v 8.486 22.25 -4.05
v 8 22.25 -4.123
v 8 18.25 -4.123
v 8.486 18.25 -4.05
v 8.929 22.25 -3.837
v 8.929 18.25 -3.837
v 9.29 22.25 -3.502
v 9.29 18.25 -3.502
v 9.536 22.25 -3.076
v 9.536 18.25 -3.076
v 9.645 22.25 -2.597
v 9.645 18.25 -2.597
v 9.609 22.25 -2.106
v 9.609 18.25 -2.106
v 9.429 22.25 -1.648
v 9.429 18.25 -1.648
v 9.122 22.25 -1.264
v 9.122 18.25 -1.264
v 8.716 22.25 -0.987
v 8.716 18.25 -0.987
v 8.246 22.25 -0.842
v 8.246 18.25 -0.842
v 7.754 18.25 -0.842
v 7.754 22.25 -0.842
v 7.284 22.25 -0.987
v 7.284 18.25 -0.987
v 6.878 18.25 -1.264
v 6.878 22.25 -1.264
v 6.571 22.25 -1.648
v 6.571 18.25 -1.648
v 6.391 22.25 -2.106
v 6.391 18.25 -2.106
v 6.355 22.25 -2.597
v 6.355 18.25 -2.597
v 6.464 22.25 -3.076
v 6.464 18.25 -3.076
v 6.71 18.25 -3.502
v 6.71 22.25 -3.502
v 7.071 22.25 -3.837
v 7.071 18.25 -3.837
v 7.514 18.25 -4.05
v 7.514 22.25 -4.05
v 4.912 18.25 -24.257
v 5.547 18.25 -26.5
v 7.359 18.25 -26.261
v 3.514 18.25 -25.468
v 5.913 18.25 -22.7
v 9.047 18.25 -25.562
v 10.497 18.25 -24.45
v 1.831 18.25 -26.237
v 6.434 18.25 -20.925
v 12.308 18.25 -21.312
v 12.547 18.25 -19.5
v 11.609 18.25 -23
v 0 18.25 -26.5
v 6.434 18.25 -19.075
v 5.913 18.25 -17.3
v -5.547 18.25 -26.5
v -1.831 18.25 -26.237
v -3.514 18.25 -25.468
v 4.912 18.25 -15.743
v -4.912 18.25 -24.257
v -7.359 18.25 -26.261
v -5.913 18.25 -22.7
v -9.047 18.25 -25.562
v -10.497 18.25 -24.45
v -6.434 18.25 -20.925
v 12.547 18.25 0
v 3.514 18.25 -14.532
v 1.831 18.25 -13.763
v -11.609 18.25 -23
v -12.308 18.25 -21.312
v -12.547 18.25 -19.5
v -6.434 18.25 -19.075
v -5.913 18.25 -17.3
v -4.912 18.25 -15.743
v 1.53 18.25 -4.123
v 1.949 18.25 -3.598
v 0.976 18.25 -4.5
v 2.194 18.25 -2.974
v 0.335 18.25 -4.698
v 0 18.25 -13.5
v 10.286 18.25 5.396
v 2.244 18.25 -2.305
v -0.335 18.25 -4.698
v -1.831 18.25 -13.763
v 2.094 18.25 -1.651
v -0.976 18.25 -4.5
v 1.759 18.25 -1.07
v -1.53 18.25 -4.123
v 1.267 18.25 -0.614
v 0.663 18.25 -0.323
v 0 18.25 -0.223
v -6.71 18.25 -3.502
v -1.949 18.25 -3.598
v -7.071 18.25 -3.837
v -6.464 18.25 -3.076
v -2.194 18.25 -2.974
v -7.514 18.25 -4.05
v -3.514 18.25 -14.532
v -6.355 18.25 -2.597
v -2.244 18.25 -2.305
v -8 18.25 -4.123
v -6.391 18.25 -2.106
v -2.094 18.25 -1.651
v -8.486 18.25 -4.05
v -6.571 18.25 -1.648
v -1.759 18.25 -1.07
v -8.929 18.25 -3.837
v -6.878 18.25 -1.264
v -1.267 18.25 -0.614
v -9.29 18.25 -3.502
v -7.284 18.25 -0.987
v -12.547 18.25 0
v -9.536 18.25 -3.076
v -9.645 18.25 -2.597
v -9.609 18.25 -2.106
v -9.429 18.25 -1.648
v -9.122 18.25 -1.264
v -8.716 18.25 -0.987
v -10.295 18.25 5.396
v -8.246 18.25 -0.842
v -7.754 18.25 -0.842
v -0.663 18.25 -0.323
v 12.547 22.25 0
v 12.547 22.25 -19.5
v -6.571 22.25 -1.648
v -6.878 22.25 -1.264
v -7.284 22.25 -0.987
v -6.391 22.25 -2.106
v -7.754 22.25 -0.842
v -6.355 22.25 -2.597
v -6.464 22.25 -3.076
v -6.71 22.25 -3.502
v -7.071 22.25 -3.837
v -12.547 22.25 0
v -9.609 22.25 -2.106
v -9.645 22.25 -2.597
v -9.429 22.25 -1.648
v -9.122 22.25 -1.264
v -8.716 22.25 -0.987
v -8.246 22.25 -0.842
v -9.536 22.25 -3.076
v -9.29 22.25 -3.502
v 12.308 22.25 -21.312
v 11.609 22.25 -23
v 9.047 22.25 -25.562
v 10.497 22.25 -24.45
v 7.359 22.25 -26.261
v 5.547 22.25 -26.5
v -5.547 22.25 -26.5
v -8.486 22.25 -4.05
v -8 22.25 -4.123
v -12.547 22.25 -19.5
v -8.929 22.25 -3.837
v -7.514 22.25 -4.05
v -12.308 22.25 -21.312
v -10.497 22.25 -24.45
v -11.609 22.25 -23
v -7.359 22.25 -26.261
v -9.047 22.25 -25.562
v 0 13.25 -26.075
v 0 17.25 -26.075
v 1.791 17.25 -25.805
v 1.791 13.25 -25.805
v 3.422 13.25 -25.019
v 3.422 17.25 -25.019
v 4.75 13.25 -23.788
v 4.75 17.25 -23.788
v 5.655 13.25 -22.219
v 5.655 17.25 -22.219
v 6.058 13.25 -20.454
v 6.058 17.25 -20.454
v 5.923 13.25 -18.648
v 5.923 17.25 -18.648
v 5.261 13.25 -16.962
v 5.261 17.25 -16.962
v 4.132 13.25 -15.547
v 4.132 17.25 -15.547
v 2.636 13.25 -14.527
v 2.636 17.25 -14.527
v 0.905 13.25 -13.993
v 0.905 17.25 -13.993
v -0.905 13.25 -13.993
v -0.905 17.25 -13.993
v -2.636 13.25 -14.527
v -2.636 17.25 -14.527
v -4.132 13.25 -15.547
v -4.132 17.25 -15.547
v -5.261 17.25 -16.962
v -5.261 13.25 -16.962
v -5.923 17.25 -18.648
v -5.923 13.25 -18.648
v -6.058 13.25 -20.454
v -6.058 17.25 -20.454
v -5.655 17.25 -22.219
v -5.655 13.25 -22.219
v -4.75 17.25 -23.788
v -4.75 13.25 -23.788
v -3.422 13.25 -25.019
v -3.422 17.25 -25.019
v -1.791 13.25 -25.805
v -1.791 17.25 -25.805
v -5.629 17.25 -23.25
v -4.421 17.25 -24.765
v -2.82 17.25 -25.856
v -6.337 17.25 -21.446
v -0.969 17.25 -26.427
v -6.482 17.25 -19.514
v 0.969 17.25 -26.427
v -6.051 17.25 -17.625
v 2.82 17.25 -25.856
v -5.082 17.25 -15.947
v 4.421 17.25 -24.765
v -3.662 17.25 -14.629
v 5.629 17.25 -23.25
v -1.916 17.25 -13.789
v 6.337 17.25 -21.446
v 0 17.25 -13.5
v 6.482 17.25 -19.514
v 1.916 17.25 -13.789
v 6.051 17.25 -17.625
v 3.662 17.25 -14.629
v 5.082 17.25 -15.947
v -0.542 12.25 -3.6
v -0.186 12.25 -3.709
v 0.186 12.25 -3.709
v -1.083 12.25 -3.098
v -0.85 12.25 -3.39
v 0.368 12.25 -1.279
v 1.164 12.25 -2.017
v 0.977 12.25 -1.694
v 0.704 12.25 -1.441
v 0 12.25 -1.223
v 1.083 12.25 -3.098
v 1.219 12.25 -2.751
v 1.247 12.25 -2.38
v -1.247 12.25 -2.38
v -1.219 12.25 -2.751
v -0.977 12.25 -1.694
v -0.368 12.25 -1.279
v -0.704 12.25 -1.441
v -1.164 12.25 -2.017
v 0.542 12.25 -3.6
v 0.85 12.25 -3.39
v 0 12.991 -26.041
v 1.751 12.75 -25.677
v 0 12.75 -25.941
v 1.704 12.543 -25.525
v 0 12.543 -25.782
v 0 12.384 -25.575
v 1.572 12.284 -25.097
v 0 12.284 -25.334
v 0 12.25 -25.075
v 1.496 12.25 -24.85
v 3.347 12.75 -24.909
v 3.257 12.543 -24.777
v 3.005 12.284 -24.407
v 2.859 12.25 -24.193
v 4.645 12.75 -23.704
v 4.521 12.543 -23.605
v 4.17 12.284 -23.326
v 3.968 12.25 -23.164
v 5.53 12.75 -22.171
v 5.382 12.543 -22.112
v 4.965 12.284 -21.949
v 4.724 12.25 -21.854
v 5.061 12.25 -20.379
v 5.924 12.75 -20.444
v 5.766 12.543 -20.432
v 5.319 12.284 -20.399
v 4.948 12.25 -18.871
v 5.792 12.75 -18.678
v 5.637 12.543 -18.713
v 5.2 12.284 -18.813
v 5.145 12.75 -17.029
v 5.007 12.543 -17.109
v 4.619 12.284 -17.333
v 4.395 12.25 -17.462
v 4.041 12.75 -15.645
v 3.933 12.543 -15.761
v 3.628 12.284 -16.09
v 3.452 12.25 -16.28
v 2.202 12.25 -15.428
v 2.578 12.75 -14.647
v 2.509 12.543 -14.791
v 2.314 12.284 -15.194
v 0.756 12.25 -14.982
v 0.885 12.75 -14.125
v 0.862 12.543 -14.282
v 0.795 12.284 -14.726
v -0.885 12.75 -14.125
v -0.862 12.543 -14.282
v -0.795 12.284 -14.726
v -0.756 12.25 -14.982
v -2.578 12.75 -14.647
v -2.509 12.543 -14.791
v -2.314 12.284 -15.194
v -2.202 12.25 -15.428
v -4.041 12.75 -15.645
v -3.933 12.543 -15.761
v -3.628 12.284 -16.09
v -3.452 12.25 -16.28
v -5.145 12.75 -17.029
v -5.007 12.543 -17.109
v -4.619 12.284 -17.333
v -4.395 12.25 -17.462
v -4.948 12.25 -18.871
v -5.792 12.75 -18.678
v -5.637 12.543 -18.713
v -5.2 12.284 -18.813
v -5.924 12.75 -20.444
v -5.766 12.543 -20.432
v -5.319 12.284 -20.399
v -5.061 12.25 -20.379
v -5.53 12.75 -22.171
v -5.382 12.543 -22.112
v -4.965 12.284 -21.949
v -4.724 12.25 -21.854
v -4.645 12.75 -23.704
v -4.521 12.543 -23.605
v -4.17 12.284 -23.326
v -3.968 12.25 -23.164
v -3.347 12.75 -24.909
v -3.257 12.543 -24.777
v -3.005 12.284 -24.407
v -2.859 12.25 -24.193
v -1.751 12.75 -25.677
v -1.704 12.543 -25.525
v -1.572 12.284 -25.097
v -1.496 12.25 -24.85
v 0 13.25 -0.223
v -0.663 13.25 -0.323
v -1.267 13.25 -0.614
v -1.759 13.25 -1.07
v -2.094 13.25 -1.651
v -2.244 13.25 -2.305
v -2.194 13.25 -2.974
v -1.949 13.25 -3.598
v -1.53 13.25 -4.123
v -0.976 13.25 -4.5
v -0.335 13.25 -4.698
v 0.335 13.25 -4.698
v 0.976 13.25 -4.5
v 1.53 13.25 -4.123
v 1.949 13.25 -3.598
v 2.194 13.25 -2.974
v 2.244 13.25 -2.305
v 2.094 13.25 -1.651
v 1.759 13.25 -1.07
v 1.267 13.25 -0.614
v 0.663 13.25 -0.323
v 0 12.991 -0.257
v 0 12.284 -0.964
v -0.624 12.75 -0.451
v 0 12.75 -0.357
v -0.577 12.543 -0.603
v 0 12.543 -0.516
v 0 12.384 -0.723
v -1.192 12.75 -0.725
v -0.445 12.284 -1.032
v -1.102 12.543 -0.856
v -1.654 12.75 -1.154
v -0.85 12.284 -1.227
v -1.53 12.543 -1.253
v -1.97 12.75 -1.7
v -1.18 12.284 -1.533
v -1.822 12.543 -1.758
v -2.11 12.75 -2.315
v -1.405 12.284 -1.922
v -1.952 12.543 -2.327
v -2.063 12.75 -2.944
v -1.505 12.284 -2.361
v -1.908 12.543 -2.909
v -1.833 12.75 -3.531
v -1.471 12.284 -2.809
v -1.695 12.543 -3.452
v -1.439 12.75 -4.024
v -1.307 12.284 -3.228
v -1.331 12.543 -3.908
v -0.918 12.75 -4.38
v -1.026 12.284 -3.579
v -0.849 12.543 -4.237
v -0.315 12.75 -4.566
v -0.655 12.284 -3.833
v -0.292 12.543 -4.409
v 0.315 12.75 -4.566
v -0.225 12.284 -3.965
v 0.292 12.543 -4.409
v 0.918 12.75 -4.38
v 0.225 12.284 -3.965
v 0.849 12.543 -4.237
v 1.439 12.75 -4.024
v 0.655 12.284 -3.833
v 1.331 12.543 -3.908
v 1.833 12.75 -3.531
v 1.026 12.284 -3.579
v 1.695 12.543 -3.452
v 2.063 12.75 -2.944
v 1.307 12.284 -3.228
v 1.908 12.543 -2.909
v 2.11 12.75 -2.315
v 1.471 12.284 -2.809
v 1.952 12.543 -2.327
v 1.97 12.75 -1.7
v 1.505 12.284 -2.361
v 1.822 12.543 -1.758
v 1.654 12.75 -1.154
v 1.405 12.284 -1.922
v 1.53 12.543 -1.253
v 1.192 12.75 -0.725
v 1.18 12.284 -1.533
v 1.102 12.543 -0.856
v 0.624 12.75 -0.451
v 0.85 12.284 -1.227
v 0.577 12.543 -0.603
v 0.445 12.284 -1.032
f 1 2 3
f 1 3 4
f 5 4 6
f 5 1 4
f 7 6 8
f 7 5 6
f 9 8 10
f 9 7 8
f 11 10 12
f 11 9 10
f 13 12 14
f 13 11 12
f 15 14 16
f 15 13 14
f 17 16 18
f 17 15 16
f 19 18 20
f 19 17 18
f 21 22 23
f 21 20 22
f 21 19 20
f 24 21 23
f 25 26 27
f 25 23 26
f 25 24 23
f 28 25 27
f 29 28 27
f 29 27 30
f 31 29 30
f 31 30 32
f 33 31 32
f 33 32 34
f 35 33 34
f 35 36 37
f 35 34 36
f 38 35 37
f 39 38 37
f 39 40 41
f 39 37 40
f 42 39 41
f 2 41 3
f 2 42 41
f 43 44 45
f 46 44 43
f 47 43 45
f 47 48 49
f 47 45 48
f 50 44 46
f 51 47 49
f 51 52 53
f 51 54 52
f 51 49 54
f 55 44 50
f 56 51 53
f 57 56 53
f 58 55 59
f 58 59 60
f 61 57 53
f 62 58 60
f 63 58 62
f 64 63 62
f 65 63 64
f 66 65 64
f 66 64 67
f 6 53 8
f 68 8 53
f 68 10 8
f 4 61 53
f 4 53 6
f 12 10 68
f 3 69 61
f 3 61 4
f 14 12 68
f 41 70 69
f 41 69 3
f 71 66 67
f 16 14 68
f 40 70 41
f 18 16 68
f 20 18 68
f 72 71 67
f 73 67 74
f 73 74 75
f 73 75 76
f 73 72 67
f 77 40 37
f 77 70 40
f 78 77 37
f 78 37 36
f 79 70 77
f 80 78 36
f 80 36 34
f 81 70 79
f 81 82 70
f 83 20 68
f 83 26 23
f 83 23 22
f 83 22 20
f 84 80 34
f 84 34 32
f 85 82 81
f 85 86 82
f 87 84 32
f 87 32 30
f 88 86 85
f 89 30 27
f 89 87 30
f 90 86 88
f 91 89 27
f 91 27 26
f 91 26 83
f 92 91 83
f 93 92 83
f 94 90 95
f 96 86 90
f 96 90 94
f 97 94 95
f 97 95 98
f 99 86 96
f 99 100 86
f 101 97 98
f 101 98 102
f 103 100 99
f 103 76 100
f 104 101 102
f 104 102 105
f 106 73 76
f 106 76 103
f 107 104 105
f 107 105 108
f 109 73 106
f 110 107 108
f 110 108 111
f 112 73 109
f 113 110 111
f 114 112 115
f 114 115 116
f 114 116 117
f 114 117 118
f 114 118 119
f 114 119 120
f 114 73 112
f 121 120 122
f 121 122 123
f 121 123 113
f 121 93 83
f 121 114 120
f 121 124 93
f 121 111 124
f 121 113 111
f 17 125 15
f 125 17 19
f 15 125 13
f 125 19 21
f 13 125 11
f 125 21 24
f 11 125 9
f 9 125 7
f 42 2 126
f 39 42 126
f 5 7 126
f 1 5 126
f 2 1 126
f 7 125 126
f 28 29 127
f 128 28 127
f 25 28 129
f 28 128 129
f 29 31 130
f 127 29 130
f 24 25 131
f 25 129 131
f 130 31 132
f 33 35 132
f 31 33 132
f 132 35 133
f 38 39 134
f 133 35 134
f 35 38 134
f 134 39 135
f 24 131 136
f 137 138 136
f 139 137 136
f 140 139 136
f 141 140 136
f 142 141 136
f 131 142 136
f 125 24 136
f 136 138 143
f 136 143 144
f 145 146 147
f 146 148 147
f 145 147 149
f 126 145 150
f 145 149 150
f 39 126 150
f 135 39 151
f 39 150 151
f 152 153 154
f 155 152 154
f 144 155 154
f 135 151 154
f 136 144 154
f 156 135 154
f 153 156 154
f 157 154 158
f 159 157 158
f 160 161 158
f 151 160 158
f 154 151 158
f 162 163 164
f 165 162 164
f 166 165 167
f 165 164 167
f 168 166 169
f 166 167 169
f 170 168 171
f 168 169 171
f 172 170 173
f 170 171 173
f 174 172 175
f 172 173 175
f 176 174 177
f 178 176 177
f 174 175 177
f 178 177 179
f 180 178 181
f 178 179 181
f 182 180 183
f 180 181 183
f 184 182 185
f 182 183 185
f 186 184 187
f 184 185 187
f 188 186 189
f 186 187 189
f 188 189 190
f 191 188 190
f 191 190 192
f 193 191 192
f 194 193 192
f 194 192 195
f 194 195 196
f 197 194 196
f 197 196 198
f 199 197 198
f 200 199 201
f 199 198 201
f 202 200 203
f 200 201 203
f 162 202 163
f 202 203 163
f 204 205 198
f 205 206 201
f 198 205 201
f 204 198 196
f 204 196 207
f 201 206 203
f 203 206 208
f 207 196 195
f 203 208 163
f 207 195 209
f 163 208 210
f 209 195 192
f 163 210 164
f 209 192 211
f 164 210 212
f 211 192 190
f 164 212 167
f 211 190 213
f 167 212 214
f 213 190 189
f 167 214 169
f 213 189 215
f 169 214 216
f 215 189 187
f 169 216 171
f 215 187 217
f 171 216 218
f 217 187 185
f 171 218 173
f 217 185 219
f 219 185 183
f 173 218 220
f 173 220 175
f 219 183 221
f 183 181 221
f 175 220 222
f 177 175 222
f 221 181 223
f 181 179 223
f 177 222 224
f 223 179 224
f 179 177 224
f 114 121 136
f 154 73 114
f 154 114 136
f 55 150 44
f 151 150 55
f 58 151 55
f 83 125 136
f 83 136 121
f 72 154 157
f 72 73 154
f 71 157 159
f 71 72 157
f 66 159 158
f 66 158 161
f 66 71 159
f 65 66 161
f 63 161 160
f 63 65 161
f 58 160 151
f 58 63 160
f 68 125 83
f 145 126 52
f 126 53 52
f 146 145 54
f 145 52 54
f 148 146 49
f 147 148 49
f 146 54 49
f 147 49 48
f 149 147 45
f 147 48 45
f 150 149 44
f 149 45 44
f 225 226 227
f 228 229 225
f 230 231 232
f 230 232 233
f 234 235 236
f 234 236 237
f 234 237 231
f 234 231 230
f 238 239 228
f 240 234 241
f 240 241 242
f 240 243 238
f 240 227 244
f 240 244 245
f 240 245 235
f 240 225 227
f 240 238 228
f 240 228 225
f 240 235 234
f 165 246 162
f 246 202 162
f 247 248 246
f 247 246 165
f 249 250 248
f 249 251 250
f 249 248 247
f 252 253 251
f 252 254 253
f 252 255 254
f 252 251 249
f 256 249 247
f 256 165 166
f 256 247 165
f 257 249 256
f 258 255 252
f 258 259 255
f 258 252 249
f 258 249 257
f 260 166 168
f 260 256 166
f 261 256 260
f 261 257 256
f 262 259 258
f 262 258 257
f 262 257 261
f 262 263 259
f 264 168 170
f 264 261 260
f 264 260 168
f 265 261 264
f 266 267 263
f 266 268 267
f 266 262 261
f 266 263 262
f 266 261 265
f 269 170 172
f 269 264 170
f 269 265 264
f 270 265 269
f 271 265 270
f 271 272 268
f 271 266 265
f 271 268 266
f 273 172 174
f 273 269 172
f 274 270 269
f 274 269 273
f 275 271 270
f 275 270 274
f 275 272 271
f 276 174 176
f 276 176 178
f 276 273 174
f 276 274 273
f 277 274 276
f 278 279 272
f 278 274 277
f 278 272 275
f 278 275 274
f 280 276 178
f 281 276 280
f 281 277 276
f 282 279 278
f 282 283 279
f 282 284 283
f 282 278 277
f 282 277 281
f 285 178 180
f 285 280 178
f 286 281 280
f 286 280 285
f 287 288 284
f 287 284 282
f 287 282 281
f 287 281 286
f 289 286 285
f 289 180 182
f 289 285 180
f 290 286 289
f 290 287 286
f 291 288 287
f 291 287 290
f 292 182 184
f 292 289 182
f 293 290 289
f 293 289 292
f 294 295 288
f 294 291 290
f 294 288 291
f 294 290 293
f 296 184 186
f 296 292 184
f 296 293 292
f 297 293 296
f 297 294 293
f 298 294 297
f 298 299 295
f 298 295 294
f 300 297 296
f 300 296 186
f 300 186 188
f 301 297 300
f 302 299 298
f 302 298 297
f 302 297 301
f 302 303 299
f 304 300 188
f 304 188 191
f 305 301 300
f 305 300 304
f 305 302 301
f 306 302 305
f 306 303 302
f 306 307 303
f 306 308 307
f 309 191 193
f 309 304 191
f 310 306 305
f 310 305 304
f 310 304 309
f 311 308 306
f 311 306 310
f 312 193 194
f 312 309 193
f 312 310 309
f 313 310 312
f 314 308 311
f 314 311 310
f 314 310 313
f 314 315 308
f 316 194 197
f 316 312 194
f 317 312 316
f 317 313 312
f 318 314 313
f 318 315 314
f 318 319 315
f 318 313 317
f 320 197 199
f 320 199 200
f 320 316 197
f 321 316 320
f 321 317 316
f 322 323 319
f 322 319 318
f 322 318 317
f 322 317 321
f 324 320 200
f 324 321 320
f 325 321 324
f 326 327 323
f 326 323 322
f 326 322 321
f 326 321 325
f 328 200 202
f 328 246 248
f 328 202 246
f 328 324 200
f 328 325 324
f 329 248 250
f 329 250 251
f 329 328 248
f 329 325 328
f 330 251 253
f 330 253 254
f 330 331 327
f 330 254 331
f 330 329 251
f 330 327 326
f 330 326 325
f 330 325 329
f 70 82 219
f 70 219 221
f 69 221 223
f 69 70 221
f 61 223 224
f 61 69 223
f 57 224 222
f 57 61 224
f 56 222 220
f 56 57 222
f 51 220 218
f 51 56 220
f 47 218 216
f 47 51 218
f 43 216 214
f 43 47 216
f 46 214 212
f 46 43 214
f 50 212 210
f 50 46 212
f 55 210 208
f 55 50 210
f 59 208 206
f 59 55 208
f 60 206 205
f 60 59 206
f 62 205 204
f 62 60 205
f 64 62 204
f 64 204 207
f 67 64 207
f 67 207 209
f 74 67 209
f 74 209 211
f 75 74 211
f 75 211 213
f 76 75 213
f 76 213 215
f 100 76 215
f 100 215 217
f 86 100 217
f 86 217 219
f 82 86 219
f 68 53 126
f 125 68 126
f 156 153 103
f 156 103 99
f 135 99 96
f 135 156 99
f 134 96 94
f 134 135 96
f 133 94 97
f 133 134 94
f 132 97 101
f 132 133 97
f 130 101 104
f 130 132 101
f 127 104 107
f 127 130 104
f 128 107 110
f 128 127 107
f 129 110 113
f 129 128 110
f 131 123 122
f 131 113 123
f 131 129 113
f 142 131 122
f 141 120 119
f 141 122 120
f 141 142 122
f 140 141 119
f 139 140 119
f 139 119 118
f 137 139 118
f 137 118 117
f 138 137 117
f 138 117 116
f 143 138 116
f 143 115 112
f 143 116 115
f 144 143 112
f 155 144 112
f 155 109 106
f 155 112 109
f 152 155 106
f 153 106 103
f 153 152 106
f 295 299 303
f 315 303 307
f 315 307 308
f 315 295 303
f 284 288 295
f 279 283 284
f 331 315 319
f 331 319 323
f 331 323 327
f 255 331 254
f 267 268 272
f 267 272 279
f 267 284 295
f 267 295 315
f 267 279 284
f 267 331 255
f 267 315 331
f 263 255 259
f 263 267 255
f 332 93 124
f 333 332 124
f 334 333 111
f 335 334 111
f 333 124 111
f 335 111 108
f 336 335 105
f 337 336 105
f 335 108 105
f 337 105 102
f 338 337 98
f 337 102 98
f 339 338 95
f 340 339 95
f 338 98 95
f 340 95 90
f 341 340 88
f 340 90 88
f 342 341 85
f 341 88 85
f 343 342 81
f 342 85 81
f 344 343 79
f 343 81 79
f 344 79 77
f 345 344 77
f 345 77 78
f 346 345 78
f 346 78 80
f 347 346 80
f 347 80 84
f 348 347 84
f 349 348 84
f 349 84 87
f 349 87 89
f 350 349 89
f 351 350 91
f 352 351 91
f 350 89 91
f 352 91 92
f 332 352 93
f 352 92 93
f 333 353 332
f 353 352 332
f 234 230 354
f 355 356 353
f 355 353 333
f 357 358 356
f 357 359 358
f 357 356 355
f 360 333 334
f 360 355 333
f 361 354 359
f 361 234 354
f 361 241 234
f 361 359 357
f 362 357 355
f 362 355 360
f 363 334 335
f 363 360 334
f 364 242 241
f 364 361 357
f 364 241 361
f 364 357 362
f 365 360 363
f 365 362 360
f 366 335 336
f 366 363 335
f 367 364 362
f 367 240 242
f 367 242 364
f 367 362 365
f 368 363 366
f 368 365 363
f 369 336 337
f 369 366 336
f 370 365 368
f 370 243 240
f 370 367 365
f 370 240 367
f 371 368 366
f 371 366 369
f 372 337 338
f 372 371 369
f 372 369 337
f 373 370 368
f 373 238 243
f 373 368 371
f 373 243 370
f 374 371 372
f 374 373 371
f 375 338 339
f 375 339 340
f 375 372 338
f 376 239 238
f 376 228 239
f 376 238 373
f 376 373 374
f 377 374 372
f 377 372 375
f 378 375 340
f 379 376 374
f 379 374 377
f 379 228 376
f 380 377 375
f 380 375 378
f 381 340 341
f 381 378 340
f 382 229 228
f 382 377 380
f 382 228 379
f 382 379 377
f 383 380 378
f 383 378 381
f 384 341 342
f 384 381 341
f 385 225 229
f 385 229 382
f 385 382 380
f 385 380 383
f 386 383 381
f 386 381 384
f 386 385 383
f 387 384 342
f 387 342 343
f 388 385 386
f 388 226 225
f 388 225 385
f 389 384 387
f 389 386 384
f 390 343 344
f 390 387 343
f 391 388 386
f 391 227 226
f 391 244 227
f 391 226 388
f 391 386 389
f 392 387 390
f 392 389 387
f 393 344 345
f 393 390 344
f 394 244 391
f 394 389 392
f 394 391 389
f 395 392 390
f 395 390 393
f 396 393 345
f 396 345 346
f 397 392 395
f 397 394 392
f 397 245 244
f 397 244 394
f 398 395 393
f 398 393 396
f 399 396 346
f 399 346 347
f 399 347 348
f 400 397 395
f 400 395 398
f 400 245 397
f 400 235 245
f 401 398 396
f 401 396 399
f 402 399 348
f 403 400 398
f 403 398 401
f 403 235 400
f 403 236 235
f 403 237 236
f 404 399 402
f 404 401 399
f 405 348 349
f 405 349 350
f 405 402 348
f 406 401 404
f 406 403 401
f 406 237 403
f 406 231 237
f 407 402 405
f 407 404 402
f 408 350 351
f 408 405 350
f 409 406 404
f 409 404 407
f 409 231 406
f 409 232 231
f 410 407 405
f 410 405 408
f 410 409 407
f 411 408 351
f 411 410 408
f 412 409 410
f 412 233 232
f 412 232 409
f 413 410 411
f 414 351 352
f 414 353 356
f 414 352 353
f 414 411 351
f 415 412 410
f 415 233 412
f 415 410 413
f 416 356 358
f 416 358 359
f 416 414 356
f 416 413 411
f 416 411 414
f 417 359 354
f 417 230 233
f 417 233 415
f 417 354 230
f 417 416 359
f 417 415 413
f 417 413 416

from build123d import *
from OCP.BRepFilletAPI import BRepFilletAPI_MakeChamfer

# Parameters (mm, degrees)
SKETCH4_W                = 12.46
SKETCH4_H                = 17.25
BOSS_EXTRUDE3_DEPTH      = 6
BOSS_EXTRUDE6_DEPTH      = 7.3
BOSS_EXTRUDE6_DEPTH_BACK = 17.25
SKETCH8_R                = 12.546781182
SKETCH8_R_2              = 11.15
BOSS_EXTRUDE4_DEPTH      = 17.25
SKETCH6_R                = 2
CUT_EXTRUDE1_DEPTH       = 5
CHAMFER1_SIZE            = 0.5
CHAMFER1_SIZE_2          = 0.866025404
SKETCH10_W               = 12.46
SKETCH10_H               = 23.7
CUT_EXTRUDE3_DEPTH       = 17.25
CUT_EXTRUDE4_REACH       = 43.938
SKETCH11_W               = 5
SKETCH11_H               = 3
BOSS_EXTRUDE7_START      = -7.3
BOSS_EXTRUDE7_DEPTH      = 7.3
BOSS_EXTRUDE9_START      = 10
BOSS_EXTRUDE9_DEPTH      = 10
BOSS_EXTRUDE10_DEPTH     = 25.093562364
SKETCH18_W               = 21.5
SKETCH18_H               = 12.438292938
CUT_EXTRUDE5_DEPTH       = 2
CUT_EXTRUDE6_DEPTH       = 58.154608998
CUT_EXTRUDE6_DEPTH_BACK  = 58.154608998
SKETCH19_R               = 3.5
FILLET1_R                = 7
CUT_EXTRUDE7_DEPTH       = 55.97840444
CUT_EXTRUDE7_DEPTH_BACK  = 55.97840444
SKETCH20_W               = 25.093562364
SKETCH20_H               = 36.096781182
BOSS_EXTRUDE11_DEPTH     = 44.5
CUT_EXTRUDE8_DEPTH       = 40.401576339
CUT_EXTRUDE8_DEPTH_BACK  = 40.401576339
CUT_EXTRUDE9_DEPTH       = 40.401576339
SKETCH24_R               = 6.5
BOSS_EXTRUDE12_DEPTH     = 5
SKETCH25_R               = 6.075
BOSS_EXTRUDE13_DEPTH     = 5
FILLET2_R                = 1
BOSS_EXTRUDE14_DEPTH     = 2
CUT_EXTRUDE10_REACH      = 57.104
SKETCH27_R               = 0.75
CUT_EXTRUDE11_DEPTH      = 45.983908275
CUT_EXTRUDE11_DEPTH_BACK = 45.983908275
CUT_EXTRUDE12_DEPTH      = 30.927775026
CUT_EXTRUDE12_DEPTH_BACK = 30.927775026
SKETCH29_R               = 1.65
SKETCH30_R               = 2.25
BOSS_EXTRUDE15_DEPTH     = 6
FILLET3_R                = 1


with BuildPart() as part:
    # Sketch4 → Boss-Extrude3 (new body)
    with BuildSketch(Plane.XY):
        with Locations((0, -1.35)):
            Rectangle(SKETCH4_W, SKETCH4_H)
    extrude(amount=BOSS_EXTRUDE3_DEPTH)



with BuildPart() as body_2:
    # Sketch8 → Boss-Extrude6 (new, two sides: drawn at the far end of the back side and taken through both)
    with BuildSketch(Plane(origin=(0, -9.975, 0), x_dir=(-1, 0, 0), z_dir=(0, -1, 0)).offset(-BOSS_EXTRUDE6_DEPTH_BACK)):
        with Locations(Location((0, -23.55, 0), (0, 0, 90))):
            Circle(SKETCH8_R)
        with Locations(Location((0, -23.55, 0), (0, 0, 90))):
            Circle(SKETCH8_R_2, mode=Mode.SUBTRACT)
    extrude(amount=BOSS_EXTRUDE6_DEPTH + BOSS_EXTRUDE6_DEPTH_BACK)


with BuildPart() as part_1:
    add(part.part)

    add(body_2.part)  # Boss-Extrude4 merges body 2
    # Sketch5 → Boss-Extrude4 (add)
    with BuildSketch(Plane(origin=(0, 7.275, 0), x_dir=(1, 0, 0), z_dir=(0, 1, 0))):
        with BuildLine():
            Line((12.546781182, -23.55), (12.546781182, 0))
            Line((12.546781182, 0), (6.23, 0))
            Line((6.23, 0), (6.23, -29.7))
            Line((6.23, -29.7), (-6.23, -29.7))
            Line((-6.23, -29.7), (-6.23, 0))
            Line((-6.23, 0), (-12.546781182, 0))
            Line((-12.546781182, 0), (-12.546781182, -23.55))
            ThreePointArc((-12.546781182, -23.55), (0, -36.096781182), (12.546781182, -23.55))
        make_face()
    extrude(amount=-BOSS_EXTRUDE4_DEPTH)

    # Sketch6 → Cut-Extrude1 (cut)
    with BuildSketch(Plane(origin=(0, 7.275, 0), x_dir=(1, 0, 0), z_dir=(0, 1, 0))):
        with Locations(Location((0, -3.5, 0), (0, 0, 270))):
            Circle(SKETCH6_R)
        with Locations(Location((0, -32.2, 0), (0, 0, 270))):
            Circle(SKETCH6_R)
    extrude(amount=-CUT_EXTRUDE1_DEPTH, mode=Mode.SUBTRACT)

    # Chamfer1
    chamfer1_edges_1 = [part_1.edges().sort_by_distance(p)[0] for p in [
        (0, 7.275, 1.5),
    ]]
    chamfer1_side_1 = [part_1.faces().sort_by_distance(p)[0] for p in [
        (0, 7.275, 1.49),
    ]]
    chamfer1_edges_2 = [part_1.edges().sort_by_distance(p)[0] for p in [
        (0, 7.275, 30.2),
    ]]
    chamfer1_side_2 = [part_1.faces().sort_by_distance(p)[0] for p in [
        (0, 7.275, 30.19),
    ]]
    chamfer1 = BRepFilletAPI_MakeChamfer(part_1.part.solid().wrapped)
    for e in chamfer1_edges_1:
        chamfer1.Add(CHAMFER1_SIZE - 0.0001, CHAMFER1_SIZE_2 - 0.0001, e.wrapped, chamfer1_side_1[0].wrapped)
    for e in chamfer1_edges_2:
        chamfer1.Add(CHAMFER1_SIZE - 0.0001, CHAMFER1_SIZE_2 - 0.0001, e.wrapped, chamfer1_side_2[0].wrapped)
    add(Compound.cast(chamfer1.Shape()), mode=Mode.REPLACE)  # a hair under: the kernel refuses the full size

    # Sketch10 → Cut-Extrude3 (cut)
    with BuildSketch(Plane(origin=(0, 7.275, 0), x_dir=(1, 0, 0), z_dir=(0, 1, 0))):
        with Locations((0, -17.85)):
            Rectangle(SKETCH10_W, SKETCH10_H)
    extrude(amount=-CUT_EXTRUDE3_DEPTH, mode=Mode.SUBTRACT)

    # Sketch11 → Cut-Extrude4 (cut, up to next)
    with BuildSketch(Plane.XY.offset(36.096781182), mode=Mode.PRIVATE) as cut_extrude4_sk1:
        with Locations((0, -8.475)):
            Rectangle(SKETCH11_W, SKETCH11_H)
    cut_extrude4_tool1 = extrude(cut_extrude4_sk1.sketch, amount=-CUT_EXTRUDE4_REACH, mode=Mode.PRIVATE) & part_1.part
    add(cut_extrude4_tool1.solids().sort_by_distance((0, -8.475, 36.096781))[0], mode=Mode.SUBTRACT)

    # Sketch13 → Boss-Extrude7 (add)
    with BuildSketch(Plane.XZ.offset(17.275).offset(BOSS_EXTRUDE7_START)):
        with BuildLine():
            Line((-12.546781182, 23.55), (-12.546781182, 0))
            Line((-12.546781182, 0), (12.546781182, 0))
            Line((12.546781182, 0), (12.546781182, 23.55))
            ThreePointArc((12.546781182, 23.55), (0, 11.003218818), (-12.546781182, 23.55))
        make_face()
    extrude(amount=BOSS_EXTRUDE7_DEPTH)

    # Sketch15 → Boss-Extrude9 (add)
    with BuildSketch(Plane(origin=(0, 7.275, 0), x_dir=(1, 0, 0), z_dir=(0, 1, 0)).offset(BOSS_EXTRUDE9_START)):
        with BuildLine():
            Line((-12.546781182, 0), (12.546781182, 0))
            Line((12.546781182, 0), (12.546781182, -23.55))
            ThreePointArc((12.546781182, -23.55), (0, -36.096781182), (-12.546781182, -23.55))
            Line((-12.546781182, -23.55), (-12.546781182, 0))
        make_face()
        with BuildLine():
            Line((-6.23, -0.8), (6.23, -0.8))
            Line((6.23, -0.8), (6.23, -33.5))
            ThreePointArc((6.23, -33.5), (5.937106781, -34.207106781), (5.23, -34.5))
            Line((5.23, -34.5), (-5.23, -34.5))
            ThreePointArc((-5.23, -34.5), (-5.937106781, -34.207106781), (-6.23, -33.5))
            Line((-6.23, -33.5), (-6.23, -0.8))
        make_face(mode=Mode.SUBTRACT)
    extrude(amount=-BOSS_EXTRUDE9_DEPTH)

    # Sketch17 → Boss-Extrude10 (add)
    with BuildSketch(Plane(origin=(-12.546781182, 4.728218818, 0), x_dir=(0, -1, 0), z_dir=(1, 0, 0))):
        Polygon((26.978218818, 26.5), (26.978218818, 0), (-17.521781182, 0), (-17.521781182, 26.5), (-13.521781182, 26.5), (-13.521781182, 5), (22.978218818, 5), (22.978218818, 26.5), align=None)
    extrude(amount=BOSS_EXTRUDE10_DEPTH)

    # Sketch18 → Cut-Extrude5 (cut)
    with BuildSketch(Plane.ZX.offset(-18.25)):
        with Locations((-15.75, 0)):
            Rectangle(SKETCH18_W, SKETCH18_H)
    extrude(amount=-CUT_EXTRUDE5_DEPTH, mode=Mode.SUBTRACT)

    # Sketch19 → Cut-Extrude6 (cut, two sides: drawn at the far end of the back side and taken through both)
    with BuildSketch(Plane.ZX.offset(-20.25).offset(-CUT_EXTRUDE6_DEPTH_BACK)):
        with Locations((-20, 0)):
            Circle(SKETCH19_R)
    extrude(amount=CUT_EXTRUDE6_DEPTH + CUT_EXTRUDE6_DEPTH_BACK, mode=Mode.SUBTRACT)

    # Fillet1
    fillet1_edges = [part_1.edges().sort_by_distance(p)[0] for p in [
        (12.546781182, -20.25, -26.5),
        (-12.546781182, -20.25, -26.5),
        (-12.546781182, 20.25, -26.5),
        (12.546781182, 20.25, -26.5),
    ]]
    fillet(fillet1_edges, radius=FILLET1_R)

    # Sketch20 → Cut-Extrude7 (cut, two sides: drawn at the far end of the back side and taken through both)
    with BuildSketch(Plane(origin=(0, 17.275, 0), x_dir=(1, 0, 0), z_dir=(0, 1, 0)).offset(-CUT_EXTRUDE7_DEPTH_BACK)):
        with Locations((0, -18.048390591)):
            Rectangle(SKETCH20_W, SKETCH20_H)
    extrude(amount=CUT_EXTRUDE7_DEPTH + CUT_EXTRUDE7_DEPTH_BACK, mode=Mode.SUBTRACT)

    # Sketch21 → Boss-Extrude11 (add)
    with BuildSketch(Plane(origin=(0, 22.25, 0), x_dir=(1, 0, 0), z_dir=(0, 1, 0))):
        Polygon((12.546781182, 0), (-0.025415104, -30), (-12.546781182, 0), align=None)
    extrude(amount=-BOSS_EXTRUDE11_DEPTH)

    # Sketch22 → Cut-Extrude8 (cut, two sides: drawn at the far end of the back side and taken through both)
    with BuildSketch(Plane(origin=(0, 0, 0), x_dir=(0, 0, -1), z_dir=(1, 0, 0)).offset(-CUT_EXTRUDE8_DEPTH_BACK)):
        Polygon((0, 22.25), (-30, 0.01), (-30, 22.25), align=None)
        Polygon((0, -22.25), (-30, -22.25), (-30, -0.01), align=None)
    extrude(amount=CUT_EXTRUDE8_DEPTH + CUT_EXTRUDE8_DEPTH_BACK, mode=Mode.SUBTRACT)

    # Sketch23 → Cut-Extrude9 (cut, through all)
    with BuildSketch(Plane(origin=(0, 0, 0), x_dir=(-1, 0, 0), z_dir=(0, 0, -1))):
        Polygon((12.546781182, 18.25), (0, 0), (12.546781182, -22.25), align=None)
    extrude(amount=-CUT_EXTRUDE9_DEPTH, mode=Mode.SUBTRACT)

    # Sketch24 → Boss-Extrude12 (add)
    with BuildSketch(Plane(origin=(0, 22.25, 0), x_dir=(1, 0, 0), z_dir=(0, 1, 0))):
        with Locations(Location((0, 20, 0), (0, 0, 270))):
            Circle(SKETCH24_R)
    extrude(amount=-BOSS_EXTRUDE12_DEPTH)

    # Sketch25 → Boss-Extrude13 (add)
    with BuildSketch(Plane.XZ.offset(-17.25)):
        with Locations(Location((0, -20, 0), (0, 0, 270))):
            Circle(SKETCH25_R)
    extrude(amount=BOSS_EXTRUDE13_DEPTH)

    # Fillet2
    fillet2_edges = [part_1.edges().sort_by_distance(p)[0] for p in [
        (0, 12.25, -13.925),
    ]]
    fillet(fillet2_edges, radius=FILLET2_R)

    # Sketch26 → Boss-Extrude14 (add)
    with BuildSketch(Plane(origin=(0, -20.25, 0), x_dir=(1, 0, 0), z_dir=(0, 1, 0))):
        Polygon((-6.219146469, 5), (-2.5, 5), (-3.1585, 20), (-3.44385, 26.5), (-6.219146469, 26.5), align=None)
        Polygon((3.1585, 20), (3.44385, 26.5), (6.219146469, 26.5), (6.219146469, 5), (2.5, 5), align=None)
    extrude(amount=BOSS_EXTRUDE14_DEPTH)

    # Sketch27 → Cut-Extrude10 (cut, up to next)
    with BuildSketch(Plane.XZ.offset(22.25), mode=Mode.PRIVATE) as cut_extrude10_sk1:
        with Locations(Location((0, -10, 0), (0, 0, 270))):
            Circle(SKETCH27_R)
    cut_extrude10_tool1 = extrude(cut_extrude10_sk1.sketch, amount=-CUT_EXTRUDE10_REACH, mode=Mode.PRIVATE) & part_1.part
    # Sketch27 → Cut-Extrude10 (cut, up to next)
    with BuildSketch(Plane.XZ.offset(22.25), mode=Mode.PRIVATE) as cut_extrude10_sk2:
        with Locations(Location((0, -7.5, 0), (0, 0, 270))):
            Circle(SKETCH27_R)
    cut_extrude10_tool2 = extrude(cut_extrude10_sk2.sketch, amount=-CUT_EXTRUDE10_REACH, mode=Mode.PRIVATE) & part_1.part
    # Sketch27 → Cut-Extrude10 (cut, up to next)
    with BuildSketch(Plane.XZ.offset(22.25), mode=Mode.PRIVATE) as cut_extrude10_sk3:
        with Locations(Location((0, -12.5, 0), (0, 0, 270))):
            Circle(SKETCH27_R)
    cut_extrude10_tool3 = extrude(cut_extrude10_sk3.sketch, amount=-CUT_EXTRUDE10_REACH, mode=Mode.PRIVATE) & part_1.part
    add(cut_extrude10_tool1.solids().sort_by_distance((0, -22.25, -10))[0], mode=Mode.SUBTRACT)
    add(cut_extrude10_tool2.solids().sort_by_distance((0, -22.25, -7.5))[0], mode=Mode.SUBTRACT)
    add(cut_extrude10_tool3.solids().sort_by_distance((0, -22.25, -12.5))[0], mode=Mode.SUBTRACT)

    # Sketch28 → Cut-Extrude11 (cut, two sides: drawn at the far end of the back side and taken through both)
    with BuildSketch(Plane(origin=(12.546781182, 0, 0), x_dir=(0, 0, -1), z_dir=(1, 0, 0)).offset(-CUT_EXTRUDE11_DEPTH_BACK)):
        Polygon((5, 18.25), (-35.232883585, 18.25), (-35.232883585, -25.616523732), (31.598677018, -25.616523732), (31.598677018, 10.892065209), (5, 10.892065209), align=None)
    extrude(amount=CUT_EXTRUDE11_DEPTH + CUT_EXTRUDE11_DEPTH_BACK, mode=Mode.SUBTRACT)

    # Sketch29 → Cut-Extrude12 (cut, two sides: drawn at the far end of the back side and taken through both)
    with BuildSketch(Plane.XZ.offset(-18.25).offset(-CUT_EXTRUDE12_DEPTH_BACK)):
        with Locations(Location((-8, -2.473316547, 0), (0, 0, 270))):
            Circle(SKETCH29_R)
        with Locations(Location((8, -2.473316547, 0), (0, 0, 270))):
            Circle(SKETCH29_R)
    extrude(amount=CUT_EXTRUDE12_DEPTH + CUT_EXTRUDE12_DEPTH_BACK, mode=Mode.SUBTRACT)

    # Sketch30 → Boss-Extrude15 (add)
    with BuildSketch(Plane.XZ.offset(-18.25)):
        with Locations(Location((0, -2.473316547, 0), (0, 0, 90))):
            Circle(SKETCH30_R)
    extrude(amount=BOSS_EXTRUDE15_DEPTH)

    # Fillet3
    fillet3_edges = [part_1.edges().sort_by_distance(p)[0] for p in [
        (0, 12.25, -4.723316547),
    ]]
    fillet(fillet3_edges, radius=FILLET3_R)


solid = part_1.part
